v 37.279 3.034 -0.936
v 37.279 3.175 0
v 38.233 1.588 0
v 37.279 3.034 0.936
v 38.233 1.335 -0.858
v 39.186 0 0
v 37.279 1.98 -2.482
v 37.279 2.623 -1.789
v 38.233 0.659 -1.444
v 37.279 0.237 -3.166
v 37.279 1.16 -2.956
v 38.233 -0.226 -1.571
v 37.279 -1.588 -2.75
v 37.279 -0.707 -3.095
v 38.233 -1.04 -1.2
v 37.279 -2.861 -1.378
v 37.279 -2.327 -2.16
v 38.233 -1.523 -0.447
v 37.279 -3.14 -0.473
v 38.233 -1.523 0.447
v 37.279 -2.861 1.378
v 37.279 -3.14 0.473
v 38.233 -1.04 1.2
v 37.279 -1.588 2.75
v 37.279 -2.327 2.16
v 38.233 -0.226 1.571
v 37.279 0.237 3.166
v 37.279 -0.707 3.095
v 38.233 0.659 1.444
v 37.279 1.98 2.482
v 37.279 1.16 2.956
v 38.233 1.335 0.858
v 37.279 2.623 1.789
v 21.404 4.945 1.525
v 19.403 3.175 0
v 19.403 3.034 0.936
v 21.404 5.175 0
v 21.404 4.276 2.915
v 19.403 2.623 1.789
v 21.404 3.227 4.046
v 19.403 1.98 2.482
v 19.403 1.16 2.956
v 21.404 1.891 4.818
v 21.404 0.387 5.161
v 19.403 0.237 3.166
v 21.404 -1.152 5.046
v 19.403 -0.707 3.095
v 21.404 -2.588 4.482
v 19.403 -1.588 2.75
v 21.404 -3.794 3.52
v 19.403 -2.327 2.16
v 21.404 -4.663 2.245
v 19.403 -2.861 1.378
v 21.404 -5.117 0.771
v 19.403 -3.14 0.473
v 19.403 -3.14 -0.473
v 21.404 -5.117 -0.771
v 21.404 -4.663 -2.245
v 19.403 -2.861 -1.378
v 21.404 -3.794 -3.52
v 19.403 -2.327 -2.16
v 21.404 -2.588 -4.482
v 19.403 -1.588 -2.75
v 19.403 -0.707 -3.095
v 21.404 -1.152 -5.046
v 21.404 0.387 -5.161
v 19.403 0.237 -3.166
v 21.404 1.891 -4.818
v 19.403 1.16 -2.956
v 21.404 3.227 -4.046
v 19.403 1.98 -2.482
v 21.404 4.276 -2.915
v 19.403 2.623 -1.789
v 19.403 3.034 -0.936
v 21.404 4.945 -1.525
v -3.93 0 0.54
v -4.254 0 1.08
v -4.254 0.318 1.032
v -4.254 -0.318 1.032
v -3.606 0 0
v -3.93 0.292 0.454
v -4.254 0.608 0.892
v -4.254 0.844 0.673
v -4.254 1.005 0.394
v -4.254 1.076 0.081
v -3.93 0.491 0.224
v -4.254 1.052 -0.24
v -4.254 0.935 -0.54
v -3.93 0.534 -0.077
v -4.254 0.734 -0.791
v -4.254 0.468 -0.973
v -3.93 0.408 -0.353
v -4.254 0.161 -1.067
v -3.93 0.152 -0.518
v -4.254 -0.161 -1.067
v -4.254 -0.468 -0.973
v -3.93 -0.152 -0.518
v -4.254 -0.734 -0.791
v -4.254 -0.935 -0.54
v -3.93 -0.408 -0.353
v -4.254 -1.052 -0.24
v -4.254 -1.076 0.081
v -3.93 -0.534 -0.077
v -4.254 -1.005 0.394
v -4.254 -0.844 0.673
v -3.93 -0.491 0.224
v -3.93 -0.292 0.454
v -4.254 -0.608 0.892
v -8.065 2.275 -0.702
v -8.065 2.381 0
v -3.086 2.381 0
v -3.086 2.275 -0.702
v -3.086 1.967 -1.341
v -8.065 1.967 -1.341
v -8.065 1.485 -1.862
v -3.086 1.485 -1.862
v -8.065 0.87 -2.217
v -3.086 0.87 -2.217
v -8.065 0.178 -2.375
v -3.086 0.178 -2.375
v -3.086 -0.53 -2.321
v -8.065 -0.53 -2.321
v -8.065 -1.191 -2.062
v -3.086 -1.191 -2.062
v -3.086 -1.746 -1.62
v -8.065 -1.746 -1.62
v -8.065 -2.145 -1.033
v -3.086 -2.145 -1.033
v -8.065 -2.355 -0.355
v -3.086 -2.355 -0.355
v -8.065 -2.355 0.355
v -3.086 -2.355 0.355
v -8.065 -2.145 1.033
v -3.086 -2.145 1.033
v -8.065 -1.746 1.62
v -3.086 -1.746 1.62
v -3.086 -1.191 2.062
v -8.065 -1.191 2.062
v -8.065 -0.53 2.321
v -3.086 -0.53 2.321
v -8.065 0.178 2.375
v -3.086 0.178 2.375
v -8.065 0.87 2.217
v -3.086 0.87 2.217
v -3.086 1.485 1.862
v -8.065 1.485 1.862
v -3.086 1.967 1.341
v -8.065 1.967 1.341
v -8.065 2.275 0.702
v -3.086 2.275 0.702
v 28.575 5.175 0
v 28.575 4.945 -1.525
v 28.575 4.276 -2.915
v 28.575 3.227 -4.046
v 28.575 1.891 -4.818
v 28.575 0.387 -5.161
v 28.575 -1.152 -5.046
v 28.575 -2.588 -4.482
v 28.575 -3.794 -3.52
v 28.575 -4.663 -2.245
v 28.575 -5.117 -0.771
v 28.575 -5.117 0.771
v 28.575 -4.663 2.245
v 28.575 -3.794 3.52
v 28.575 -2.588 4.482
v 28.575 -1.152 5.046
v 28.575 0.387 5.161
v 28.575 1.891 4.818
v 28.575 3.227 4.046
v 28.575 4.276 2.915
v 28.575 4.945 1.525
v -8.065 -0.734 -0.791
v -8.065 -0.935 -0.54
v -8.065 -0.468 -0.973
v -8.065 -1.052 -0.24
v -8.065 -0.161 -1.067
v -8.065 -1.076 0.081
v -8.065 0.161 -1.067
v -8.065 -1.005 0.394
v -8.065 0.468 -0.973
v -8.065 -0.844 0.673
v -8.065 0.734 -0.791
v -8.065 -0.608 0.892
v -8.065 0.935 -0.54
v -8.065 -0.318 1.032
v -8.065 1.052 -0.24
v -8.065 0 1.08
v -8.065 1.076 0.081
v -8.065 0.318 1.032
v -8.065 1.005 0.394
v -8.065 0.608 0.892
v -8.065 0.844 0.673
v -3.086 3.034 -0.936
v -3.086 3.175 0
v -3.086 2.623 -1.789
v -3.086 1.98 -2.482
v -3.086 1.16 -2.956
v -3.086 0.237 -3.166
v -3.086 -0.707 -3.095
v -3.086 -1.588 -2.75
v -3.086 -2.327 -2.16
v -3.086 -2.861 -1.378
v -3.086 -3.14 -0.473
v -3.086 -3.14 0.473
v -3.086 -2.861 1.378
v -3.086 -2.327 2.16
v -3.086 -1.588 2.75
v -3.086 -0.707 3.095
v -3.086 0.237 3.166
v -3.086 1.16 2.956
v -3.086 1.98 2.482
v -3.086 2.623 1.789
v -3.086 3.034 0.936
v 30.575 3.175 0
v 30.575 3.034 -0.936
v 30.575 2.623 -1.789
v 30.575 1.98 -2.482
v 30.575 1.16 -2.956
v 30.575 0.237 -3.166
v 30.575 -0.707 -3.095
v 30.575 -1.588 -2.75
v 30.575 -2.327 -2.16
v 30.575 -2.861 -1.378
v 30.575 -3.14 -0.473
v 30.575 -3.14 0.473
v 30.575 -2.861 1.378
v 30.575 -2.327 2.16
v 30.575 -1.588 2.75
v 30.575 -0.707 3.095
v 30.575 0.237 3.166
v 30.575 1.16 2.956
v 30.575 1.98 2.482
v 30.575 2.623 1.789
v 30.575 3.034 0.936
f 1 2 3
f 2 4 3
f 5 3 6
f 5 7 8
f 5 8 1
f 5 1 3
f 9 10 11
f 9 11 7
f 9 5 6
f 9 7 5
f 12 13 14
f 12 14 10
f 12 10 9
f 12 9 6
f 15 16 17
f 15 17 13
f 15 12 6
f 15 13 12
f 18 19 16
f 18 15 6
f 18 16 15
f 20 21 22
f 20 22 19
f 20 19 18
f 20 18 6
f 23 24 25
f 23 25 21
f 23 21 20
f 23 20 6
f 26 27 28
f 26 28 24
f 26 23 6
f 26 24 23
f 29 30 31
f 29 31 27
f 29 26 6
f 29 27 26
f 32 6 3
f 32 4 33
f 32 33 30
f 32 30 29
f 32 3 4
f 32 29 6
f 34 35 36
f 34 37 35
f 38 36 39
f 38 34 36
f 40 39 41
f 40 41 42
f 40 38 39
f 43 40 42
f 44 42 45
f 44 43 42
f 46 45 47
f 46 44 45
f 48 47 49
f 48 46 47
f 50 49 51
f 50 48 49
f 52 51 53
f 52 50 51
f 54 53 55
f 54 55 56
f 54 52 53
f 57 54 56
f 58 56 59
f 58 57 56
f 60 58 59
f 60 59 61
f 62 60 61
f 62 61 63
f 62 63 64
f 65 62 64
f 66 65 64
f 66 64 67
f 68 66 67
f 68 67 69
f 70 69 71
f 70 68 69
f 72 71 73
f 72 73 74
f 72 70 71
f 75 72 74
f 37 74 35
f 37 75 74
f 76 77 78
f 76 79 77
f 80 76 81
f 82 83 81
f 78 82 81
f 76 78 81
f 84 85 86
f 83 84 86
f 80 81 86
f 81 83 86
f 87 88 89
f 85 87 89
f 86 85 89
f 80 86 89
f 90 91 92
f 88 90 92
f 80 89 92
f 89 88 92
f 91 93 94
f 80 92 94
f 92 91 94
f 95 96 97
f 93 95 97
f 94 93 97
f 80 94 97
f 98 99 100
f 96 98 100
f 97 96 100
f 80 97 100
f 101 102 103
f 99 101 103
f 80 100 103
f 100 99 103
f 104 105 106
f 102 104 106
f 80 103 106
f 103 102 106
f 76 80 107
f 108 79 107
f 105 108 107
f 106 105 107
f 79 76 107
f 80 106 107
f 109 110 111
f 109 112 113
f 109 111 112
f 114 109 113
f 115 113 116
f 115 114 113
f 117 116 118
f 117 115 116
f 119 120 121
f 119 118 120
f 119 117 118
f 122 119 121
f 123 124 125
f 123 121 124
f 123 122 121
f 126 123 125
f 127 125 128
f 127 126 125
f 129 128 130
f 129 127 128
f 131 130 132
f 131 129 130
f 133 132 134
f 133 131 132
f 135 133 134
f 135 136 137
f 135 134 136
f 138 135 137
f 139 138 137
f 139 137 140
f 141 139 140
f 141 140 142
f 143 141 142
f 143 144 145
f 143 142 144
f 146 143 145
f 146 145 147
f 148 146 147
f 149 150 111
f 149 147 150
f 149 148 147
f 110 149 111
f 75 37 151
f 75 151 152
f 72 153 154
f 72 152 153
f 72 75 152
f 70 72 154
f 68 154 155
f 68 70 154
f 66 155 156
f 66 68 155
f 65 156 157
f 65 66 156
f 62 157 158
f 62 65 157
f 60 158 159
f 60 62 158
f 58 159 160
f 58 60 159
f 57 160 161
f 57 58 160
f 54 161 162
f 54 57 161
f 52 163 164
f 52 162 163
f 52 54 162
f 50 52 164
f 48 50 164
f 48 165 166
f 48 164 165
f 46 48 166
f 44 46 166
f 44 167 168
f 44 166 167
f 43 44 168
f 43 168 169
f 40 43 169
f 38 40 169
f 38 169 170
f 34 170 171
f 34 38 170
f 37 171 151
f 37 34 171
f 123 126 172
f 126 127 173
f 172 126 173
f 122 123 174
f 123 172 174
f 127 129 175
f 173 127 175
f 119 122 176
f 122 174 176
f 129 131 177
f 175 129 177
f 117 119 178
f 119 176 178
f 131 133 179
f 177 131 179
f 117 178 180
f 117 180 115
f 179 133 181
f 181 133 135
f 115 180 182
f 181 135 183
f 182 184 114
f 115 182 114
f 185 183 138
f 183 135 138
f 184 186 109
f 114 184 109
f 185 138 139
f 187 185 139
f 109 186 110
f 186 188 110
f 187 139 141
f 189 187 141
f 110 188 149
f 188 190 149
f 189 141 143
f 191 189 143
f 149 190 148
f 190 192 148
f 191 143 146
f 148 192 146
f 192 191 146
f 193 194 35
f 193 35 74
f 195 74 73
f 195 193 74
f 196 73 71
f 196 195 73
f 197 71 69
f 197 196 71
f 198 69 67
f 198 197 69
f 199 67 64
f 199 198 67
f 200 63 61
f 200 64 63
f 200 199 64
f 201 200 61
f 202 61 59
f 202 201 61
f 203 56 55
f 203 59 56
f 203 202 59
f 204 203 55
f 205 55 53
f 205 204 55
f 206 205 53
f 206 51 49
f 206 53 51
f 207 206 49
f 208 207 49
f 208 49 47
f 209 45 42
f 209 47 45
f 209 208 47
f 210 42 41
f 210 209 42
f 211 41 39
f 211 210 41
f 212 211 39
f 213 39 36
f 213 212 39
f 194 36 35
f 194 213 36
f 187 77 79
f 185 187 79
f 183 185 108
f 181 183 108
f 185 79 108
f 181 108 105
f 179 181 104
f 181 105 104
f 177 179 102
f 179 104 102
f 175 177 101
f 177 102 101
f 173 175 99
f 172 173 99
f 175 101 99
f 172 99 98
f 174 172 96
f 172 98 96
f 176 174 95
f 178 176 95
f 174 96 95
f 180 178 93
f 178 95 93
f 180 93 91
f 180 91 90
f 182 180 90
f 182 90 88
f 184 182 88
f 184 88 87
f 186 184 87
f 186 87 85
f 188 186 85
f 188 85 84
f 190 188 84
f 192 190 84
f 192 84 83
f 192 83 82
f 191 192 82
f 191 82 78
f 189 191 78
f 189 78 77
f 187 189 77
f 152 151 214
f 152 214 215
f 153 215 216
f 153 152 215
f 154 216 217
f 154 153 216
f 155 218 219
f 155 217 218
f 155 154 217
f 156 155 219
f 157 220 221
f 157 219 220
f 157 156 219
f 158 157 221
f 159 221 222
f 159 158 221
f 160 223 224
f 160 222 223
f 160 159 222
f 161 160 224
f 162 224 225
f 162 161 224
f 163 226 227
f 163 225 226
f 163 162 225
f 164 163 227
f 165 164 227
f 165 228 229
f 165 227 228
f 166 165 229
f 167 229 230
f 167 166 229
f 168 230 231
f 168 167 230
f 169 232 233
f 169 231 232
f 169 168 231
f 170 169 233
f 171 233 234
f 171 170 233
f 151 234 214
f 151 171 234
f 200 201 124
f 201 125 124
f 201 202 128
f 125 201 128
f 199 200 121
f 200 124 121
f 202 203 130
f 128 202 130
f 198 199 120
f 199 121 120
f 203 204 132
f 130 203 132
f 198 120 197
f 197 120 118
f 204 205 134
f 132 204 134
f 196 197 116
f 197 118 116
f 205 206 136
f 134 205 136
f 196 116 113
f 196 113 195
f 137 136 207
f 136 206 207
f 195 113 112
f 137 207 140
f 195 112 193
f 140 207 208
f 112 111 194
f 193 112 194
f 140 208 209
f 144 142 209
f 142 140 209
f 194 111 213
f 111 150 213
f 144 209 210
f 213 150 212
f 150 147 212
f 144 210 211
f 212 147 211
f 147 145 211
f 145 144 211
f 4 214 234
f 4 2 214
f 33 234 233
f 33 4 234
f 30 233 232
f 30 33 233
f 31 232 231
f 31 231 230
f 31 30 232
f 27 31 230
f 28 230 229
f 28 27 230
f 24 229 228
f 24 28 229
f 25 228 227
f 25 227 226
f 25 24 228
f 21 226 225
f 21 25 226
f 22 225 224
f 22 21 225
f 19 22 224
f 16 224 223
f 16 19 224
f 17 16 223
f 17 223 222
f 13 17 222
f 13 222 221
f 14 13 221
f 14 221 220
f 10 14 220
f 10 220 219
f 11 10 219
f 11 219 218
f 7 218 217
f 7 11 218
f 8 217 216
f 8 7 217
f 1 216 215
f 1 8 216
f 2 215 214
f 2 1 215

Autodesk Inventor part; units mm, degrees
ref_plane "YZ Plane" through (0, 0, 0) normal (1, 0, 0) x (0, 1, 0)
ref_plane "XZ Plane" through (0, 0, 0) normal (0, 1, 0) x (-1, 0, 0)
ref_plane "XY Plane" through (0, 0, 0) normal (0, 0, 1) x (1, 0, 0)
sketch "Sketch1" plane through (0, 0, 0) normal (0, 0, 1) x (1, 0, 0)
  line L0 (0, 0) -> (8.7313, 0) construction
  line L1 (0, 0) -> (0, 7.9375) construction
  line L2 (0, 7.9375) -> (8.7312, 7.9375) construction
  line L3 (8.7312, 7.9375) -> (8.7313, 0) construction
  line L4 (8.7312, 7.9375) -> (47.625, 7.9375) construction
  line L5 (8.7312, 7.9375) -> (8.7312, 14.2875) construction
  line L6 (8.7312, 14.2875) -> (11.9062, 14.2875) construction
  line L7 (11.9062, 14.2875) -> (11.9062, 0) construction
  line L8 (11.9062, 0) -> (8.7313, 0) construction
  line L9 (11.9062, 0) -> (21.4312, 0) construction
  line L10 (21.4312, 0) -> (21.4312, 26.67) construction
  line L11 (21.4312, 26.67) -> (11.9063, 26.67) construction
  line L12 (11.9063, 26.67) -> (11.9062, 14.2875) construction
  line L13 (16.6687, 0) -> (16.6687, 26.67) construction
  line L14 (16.6687, 17.4625) -> (23.8125, 17.4625) construction
  line L15 (23.8125, 17.4625) -> (23.8125, 0) construction
  line L16 (23.8125, 0) -> (21.4312, 0) construction
  line L17 (23.8125, 0) -> (24.6062, 0) construction
  line L18 (24.6062, 0) -> (24.6062, 14.2875) construction
  line L19 (24.6062, 14.2875) -> (23.8125, 14.2875) construction
  line L20 (23.8125, 14.2875) -> (23.8125, 0) construction
  line L21 (24.6062, 0) -> (34.1312, 0) construction
  line L22 (34.1312, 0) -> (34.1313, 20.32) construction
  line L23 (34.1313, 20.32) -> (24.6062, 20.32) construction
  line L24 (24.6062, 20.32) -> (24.6062, 0) construction
  line L25 (29.3687, 20.32) -> (29.3687, 0) construction
  line L26 (29.3687, 17.4625) -> (36.5125, 17.4625) construction
  line L27 (36.5125, 17.4625) -> (36.5125, 0) construction
  line L28 (36.5125, 0) -> (34.1312, 0) construction
  line L29 (36.5125, 0) -> (37.3062, 0) construction
  line L30 (37.3062, 0) -> (37.3062, 14.2875) construction
  line L31 (37.3062, 14.2875) -> (36.5125, 14.2875) construction
  line L32 (36.5125, 14.2875) -> (36.5125, 0) construction
  line L33 (37.3062, 0) -> (38.8937, 0) construction
  line L34 (38.8937, 0) -> (38.8937, 9.525) construction
  line L35 (38.8937, 9.525) -> (37.3062, 9.525) construction
  line L36 (37.3062, 9.525) -> (37.3062, 0) construction
  line L37 (47.625, 7.9375) -> (47.625, 0) construction
  line L38 (47.625, 0) -> (38.8937, 0) construction
  line L39 (14.2875, 26.67) -> (14.2875, 0) construction
  line L40 (26.9875, 20.32) -> (26.9875, 0) construction
  line L41 (0, 7.9375) -> (0, 17.4625) construction
  line L42 (0, 17.4625) -> (8.7312, 17.4625) construction
  line L43 (8.7312, 17.4625) -> (8.7312, 14.2875) construction
  line L44 (0, 3.175) -> (47.625, 3.175) construction
  circle A0 centre (14.2875, 5.5563) radius 2.3813 construction
  circle A1 centre (26.9875, 5.5562) radius 2.3812 construction
  circle A2 centre (14.2875, 5.8102) radius 2.3813 construction
  circle A3 centre (14.2875, 7.5565) radius 2.3813 construction
  circle A4 centre (26.9875, 5.8103) radius 2.3812 construction
  circle A5 centre (26.9875, 7.5565) radius 2.3812 construction
  line L45 (11.9062, 8.1915) -> (16.6687, 8.1915) construction
  line L46 (15.0198, 3.175) -> (17.0201, 5.1753) construction
  line L47 (17.0201, 5.1753) -> (24.2549, 5.1753) construction
  line L48 (24.2549, 5.1753) -> (26.2552, 3.175) construction
  line L49 (24.6062, 8.1915) -> (29.3687, 8.1915) construction
  line L50 (12.7, 5.1753) -> (19.8713, 5.1753) construction
  line L51 (28.575, 5.1753) -> (21.4037, 5.1753)
  line L52 (0, 6.35) -> (9.1122, 6.35) construction
  line L53 (9.1122, 6.35) -> (9.1122, 0) construction
  line L54 (12.7, 5.1753) -> (10.6997, 3.175) construction
  line L55 (19.8713, 5.1753) -> (21.8716, 3.175) construction
  line L56 (21.8716, 3.175) -> (28.575, 3.175) construction
  line L57 (28.575, 3.175) -> (30.4827, 0) construction
  line L58 (28.575, 5.1753) -> (30.5753, 3.175)
  line L59 (30.5753, 3.175) -> (37.2787, 3.175)
  line L60 (37.2787, 3.175) -> (39.1864, 0)
  line L61 (9.1122, 5.5562) -> (47.625, 5.5563) construction
  line L62 (39.5833, 0) -> (36.2448, 5.5563) construction
  line L63 (21.4037, 5.1753) -> (19.4034, 3.175)
  line L64 (19.4034, 3.175) -> (-3.0861, 3.175)
  line L65 (47.625, 7.9375) -> (47.625, 17.4625) construction
  line L66 (47.625, 17.4625) -> (38.8937, 17.4625) construction
  line L67 (38.8937, 17.4625) -> (38.8937, 9.525) construction
  line L68 (47.625, 7.9375) -> (53.975, 7.9375) construction
  line L69 (53.975, 7.9375) -> (53.975, 0) construction
  line L70 (53.975, 0) -> (47.625, 0) construction
  line L71 (53.975, 6.35) -> (66.675, 6.35) construction
  line L72 (66.675, 6.35) -> (66.675, 0) construction
  line L73 (66.675, 0) -> (53.975, 0) construction
  line L74 (-8.0645, 3.175) -> (-8.0645, 2.3812) construction
  line L75 (-8.0645, 0) -> (39.1864, 0)
  line L76 (-3.0861, 3.175) -> (-3.0861, 2.3812)
  line L77 (-3.0861, 2.3812) -> (-8.0645, 2.3812)
  line L78 (-8.0645, 3.175) -> (-8.0645, 6.35) construction
  line L79 (-8.0645, 6.35) -> (-3.0861, 6.35) construction
  line L80 (-3.0861, 6.35) -> (-3.0861, 3.175) construction
  line L81 (-3.0861, 0) -> (-3.0861, 2.3812) construction
  line L82 (-1.5875, 0) -> (-1.5875, 11.1125) construction
  line L83 (-1.5875, 11.1125) -> (-3.0861, 11.1125) construction
  line L84 (-3.0861, 11.1125) -> (-3.0861, 6.35) construction
  line L85 (-3.0861, 3.175) -> (-8.0645, 3.175) construction
  line L86 (-8.0645, 2.3812) -> (-8.0645, 0) construction
  line L87 (-8.0645, 2.7051) -> (-9.5631, 2.7051) construction
  line L88 (-9.5631, 2.7051) -> (-9.5631, 0) construction
  line L89 (-9.5631, 0) -> (-8.0645, 0) construction
  line L90 (-8.0645, 1.4224) -> (-5.5245, 1.4224) construction
  line L91 (-5.5245, 1.4224) -> (-5.5245, 0) construction
  line L92 (-5.5245, 1.4224) -> (-2.9845, 1.4224) construction
  line L93 (-2.9845, 1.4224) -> (-2.9845, 0) construction
  line L94 (-3.0861, 11.1125) -> (-14.2875, 11.1125) construction
  line L95 (-14.2875, 11.1125) -> (-14.2875, 5.9531) construction
  line L96 (-14.2875, 5.9531) -> (-18.4912, 5.9531) construction
  line L97 (-18.4912, 5.9531) -> (-18.4912, 0) construction
  line L98 (-18.4912, 0) -> (-9.5631, 0) construction
  line L99 (-8.0645, 3.9687) -> (-14.5224, 3.9687) construction
  line L100 (-14.5224, 3.9687) -> (-14.5224, 0) construction
  line L101 (-14.5224, 3.429) -> (-10.3568, 3.429) construction
  line L102 (-10.3568, 3.429) -> (-10.3568, 0) construction
  line L103 (-16.9037, 3.175) -> (-16.9037, 0) construction
  line L104 (-16.9037, 3.175) -> (-18.4912, 3.175) construction
  dimension "d0" = 8.7312
  dimension "d1" = 7.9375
  dimension "d2" = 3.175
  dimension "d3" = 14.2875
  dimension "d4" = 9.525
  dimension "d5" = 26.67
  dimension "d6" = 7.1437
  dimension "d7" = 17.4625
  dimension "d8" = 0.7937
  dimension "d9" = 14.2875
  dimension "d10" = 9.525
  dimension "d11" = 20.32
  dimension "d12" = 7.1437
  dimension "d13" = 17.4625
  dimension "d14" = 0.7937
  dimension "d15" = 14.2875
  dimension "d16" = 1.5875
  dimension "d17" = 9.525
  dimension "d18" = 8.7312
  dimension "d19" = 2.3813
  dimension "d20" = 2.3813
  dimension "d21" = 17.4625
  dimension "d22" = 3.175
  dimension "d23" = 4.7625
  dimension "d24" = 4.7625
  dimension "d26" = 0.254
  dimension "d28" = 45
  dimension "d29" = 45
  dimension "d30" = 0.254
  dimension "d31" = 7.2348
  dimension "d32" = 5.1753
  dimension "d33" = 7.1713
  dimension "d34" = 1.5875
  dimension "d35" = 7.1713
  dimension "d36" = 1.5875
  dimension "d37" = 6.35
  dimension "d39" = 45
  dimension "d40" = 45
  dimension "d41" = 1.5875
  dimension "d42" = 59
  dimension "d43" = 6.7034
  dimension "d44" = 6.7034
  dimension "d45" = 5.5563
  dimension "d46" = 0.3969
  dimension "d47" = 1.5875
  dimension "d48" = 9.1122
  dimension "d52" = 17.4625
  dimension "d53" = 6.35
  dimension "d54" = 12.7
  dimension "d55" = 6.35
  dimension "d56" = 2.3813
  dimension "d57" = 4.9784
  dimension "d58" = 6.35
  dimension "d66" = 1.4986
  dimension "d67" = 1.5875
  dimension "d68" = 11.1125
  dimension "d69" = 2.7051
  dimension "d70" = 1.4986
  dimension "d71" = 1.4224
  dimension "d72" = 2.54
  dimension "d73" = 2.54
  dimension "d74" = 3.9688
  dimension "d75" = 4.1656
  dimension "d76" = 3.429
sketch "Sketch2" plane through (0, 0, 0) normal (0, 0, 1) x (1, 0, 0)
  line L0 (19.4034, 3.175) -> (-3.0861, 3.175) projected
  line L1 (-3.0861, 3.175) -> (-3.0861, 2.3812) projected
  line L2 (-3.0861, 2.3812) -> (-8.0645, 2.3812) projected
  line L3 (-8.0645, 2.3812) -> (-8.0645, 0) projected
  line L4 (-8.0645, 0) -> (39.1864, 0) projected
  line L5 (37.2787, 3.175) -> (39.1864, 0) projected
  line L6 (30.5753, 3.175) -> (37.2787, 3.175) projected
  line L7 (28.575, 5.1753) -> (30.5753, 3.175) projected
  line L8 (28.575, 5.1753) -> (21.4037, 5.1753) projected
  line L9 (21.4037, 5.1753) -> (19.4034, 3.175) projected
  point P0 (0, 0)
revolve "Revolution1" add sketch "Sketch2" angle 360 about axis through (-8.0645, 0, 0) along (1, 0, 0)
sketch "Sketch3" plane through (-8.0645, 0, 0) normal (-1, 0, 0) x (0, 0, 1)
  circle A0 centre (0, 0) radius 2.3813 projected
hole "Hole1" at (-8.0645, 0, 0) direction (1, 0, 0) diameter 2.159 depth 3.81 tip angle 118
equation "\"d9\" = d3"
equation "\"d12\" = d6"
equation "\"d13\" = d7"
equation "\"d15\" = d9"
equation "\"d18\" = d0"
equation "\"d20\" = d19"
equation "\"d35\" = d33"
equation "\"d36\" = d34"
equation "\"d43\" = d44"
equation "\"d52\" = d13"
properties part number "Ball Shifting Outline" material "Steel, Alloy"
